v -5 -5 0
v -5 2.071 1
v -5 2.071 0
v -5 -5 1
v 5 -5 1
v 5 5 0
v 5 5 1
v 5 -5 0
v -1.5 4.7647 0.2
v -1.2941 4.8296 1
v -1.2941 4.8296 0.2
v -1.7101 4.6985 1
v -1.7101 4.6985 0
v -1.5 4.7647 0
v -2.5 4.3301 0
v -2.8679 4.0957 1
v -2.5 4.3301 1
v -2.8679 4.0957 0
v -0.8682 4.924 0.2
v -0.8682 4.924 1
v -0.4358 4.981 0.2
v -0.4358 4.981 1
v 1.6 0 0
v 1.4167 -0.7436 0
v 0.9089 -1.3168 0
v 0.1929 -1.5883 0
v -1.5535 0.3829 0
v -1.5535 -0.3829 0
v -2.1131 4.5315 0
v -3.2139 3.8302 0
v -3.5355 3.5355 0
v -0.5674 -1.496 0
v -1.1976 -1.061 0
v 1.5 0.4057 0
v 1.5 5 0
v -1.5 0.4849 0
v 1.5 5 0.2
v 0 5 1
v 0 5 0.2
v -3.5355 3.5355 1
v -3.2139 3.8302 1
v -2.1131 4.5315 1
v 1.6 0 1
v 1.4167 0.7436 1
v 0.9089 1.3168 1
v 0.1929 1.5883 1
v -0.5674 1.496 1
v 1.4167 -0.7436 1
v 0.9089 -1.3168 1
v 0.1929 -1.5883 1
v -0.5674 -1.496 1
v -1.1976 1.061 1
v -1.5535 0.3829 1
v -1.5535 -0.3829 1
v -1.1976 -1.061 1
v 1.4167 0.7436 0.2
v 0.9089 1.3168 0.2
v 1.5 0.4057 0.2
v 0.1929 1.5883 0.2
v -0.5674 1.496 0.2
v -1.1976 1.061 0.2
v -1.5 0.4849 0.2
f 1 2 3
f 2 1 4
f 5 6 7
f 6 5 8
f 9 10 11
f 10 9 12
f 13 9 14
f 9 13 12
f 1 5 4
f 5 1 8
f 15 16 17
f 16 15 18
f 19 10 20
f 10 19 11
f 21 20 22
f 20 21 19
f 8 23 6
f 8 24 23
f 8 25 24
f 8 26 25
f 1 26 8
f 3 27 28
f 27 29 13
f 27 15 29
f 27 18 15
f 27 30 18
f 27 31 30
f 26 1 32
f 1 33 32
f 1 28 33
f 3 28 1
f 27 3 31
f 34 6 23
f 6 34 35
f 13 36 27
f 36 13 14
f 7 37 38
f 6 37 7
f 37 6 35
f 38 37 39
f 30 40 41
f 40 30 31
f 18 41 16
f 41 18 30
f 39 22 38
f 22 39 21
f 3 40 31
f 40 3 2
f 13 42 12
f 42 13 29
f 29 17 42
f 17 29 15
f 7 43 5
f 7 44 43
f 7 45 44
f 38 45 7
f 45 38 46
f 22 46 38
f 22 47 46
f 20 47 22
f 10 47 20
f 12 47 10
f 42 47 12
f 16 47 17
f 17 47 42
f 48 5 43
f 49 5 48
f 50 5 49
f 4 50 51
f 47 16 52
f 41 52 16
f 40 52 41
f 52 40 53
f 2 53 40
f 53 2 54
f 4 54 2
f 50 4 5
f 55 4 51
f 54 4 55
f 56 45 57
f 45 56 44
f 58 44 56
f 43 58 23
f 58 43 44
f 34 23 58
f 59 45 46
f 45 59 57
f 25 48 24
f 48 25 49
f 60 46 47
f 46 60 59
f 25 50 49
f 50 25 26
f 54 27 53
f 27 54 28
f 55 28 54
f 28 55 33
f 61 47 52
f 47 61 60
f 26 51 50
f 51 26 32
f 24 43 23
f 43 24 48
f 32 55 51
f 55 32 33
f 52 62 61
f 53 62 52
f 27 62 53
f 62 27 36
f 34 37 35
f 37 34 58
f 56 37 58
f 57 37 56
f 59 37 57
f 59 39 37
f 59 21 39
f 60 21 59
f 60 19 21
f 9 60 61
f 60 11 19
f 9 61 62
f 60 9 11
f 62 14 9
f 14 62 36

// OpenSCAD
function aPoint(a) = [-sin(dToR(a)), cos(dToR(a))];
function dToR(a) = a * 0.017453;


$fs = 1;
$fa = 5;

// Diameter of the click-axis (for click-together type chains)
clickAxisDiameter = 3;

// Diameter of the filament (for Fila-Axis type chains)
filamentDiameter = 1.75;


module maleConnector_disk(a1, r, h = 1, a2 = 0) {
	$fs = 0.1;
	linear_extrude(height = h) {
		intersection() {
			union() {
				circle(r = r);
				rotate(a2) square([r, r]);
				rotate(90 + a1) square([r, r]);
				translate([-r, -r]) square([2*r, r]);
			}
			translate([-r, -r]) square([2*r, 2*r]);
		}
	}
}

module maleConnector_filaAxis(a1, r, h = 1, a2 = 0) {
	difference() {
		maleConnector_disk(a1, r, h, a2);
		translate([0, 0, -0.1]) cylinder(d = filamentDiameter + 0.2, h = h + 1, $fn = 13);
	}
}

module maleConnector_clickAxis(a1, r, h = 1, a2 = 0) {
	difference() {
		maleConnector_disk(a1, r, h, a2);
		translate([0, 0, -0.1]) cylinder(d = clickAxisDiameter + 0.2, h = h + 1, $fn = 13);
		translate([-clickAxisDiameter/2, 0, -0.1]) cube([clickAxisDiameter, r + 1, 0.3]);
	}
}
	
maleConnector_clickAxis(45, 5);
				
